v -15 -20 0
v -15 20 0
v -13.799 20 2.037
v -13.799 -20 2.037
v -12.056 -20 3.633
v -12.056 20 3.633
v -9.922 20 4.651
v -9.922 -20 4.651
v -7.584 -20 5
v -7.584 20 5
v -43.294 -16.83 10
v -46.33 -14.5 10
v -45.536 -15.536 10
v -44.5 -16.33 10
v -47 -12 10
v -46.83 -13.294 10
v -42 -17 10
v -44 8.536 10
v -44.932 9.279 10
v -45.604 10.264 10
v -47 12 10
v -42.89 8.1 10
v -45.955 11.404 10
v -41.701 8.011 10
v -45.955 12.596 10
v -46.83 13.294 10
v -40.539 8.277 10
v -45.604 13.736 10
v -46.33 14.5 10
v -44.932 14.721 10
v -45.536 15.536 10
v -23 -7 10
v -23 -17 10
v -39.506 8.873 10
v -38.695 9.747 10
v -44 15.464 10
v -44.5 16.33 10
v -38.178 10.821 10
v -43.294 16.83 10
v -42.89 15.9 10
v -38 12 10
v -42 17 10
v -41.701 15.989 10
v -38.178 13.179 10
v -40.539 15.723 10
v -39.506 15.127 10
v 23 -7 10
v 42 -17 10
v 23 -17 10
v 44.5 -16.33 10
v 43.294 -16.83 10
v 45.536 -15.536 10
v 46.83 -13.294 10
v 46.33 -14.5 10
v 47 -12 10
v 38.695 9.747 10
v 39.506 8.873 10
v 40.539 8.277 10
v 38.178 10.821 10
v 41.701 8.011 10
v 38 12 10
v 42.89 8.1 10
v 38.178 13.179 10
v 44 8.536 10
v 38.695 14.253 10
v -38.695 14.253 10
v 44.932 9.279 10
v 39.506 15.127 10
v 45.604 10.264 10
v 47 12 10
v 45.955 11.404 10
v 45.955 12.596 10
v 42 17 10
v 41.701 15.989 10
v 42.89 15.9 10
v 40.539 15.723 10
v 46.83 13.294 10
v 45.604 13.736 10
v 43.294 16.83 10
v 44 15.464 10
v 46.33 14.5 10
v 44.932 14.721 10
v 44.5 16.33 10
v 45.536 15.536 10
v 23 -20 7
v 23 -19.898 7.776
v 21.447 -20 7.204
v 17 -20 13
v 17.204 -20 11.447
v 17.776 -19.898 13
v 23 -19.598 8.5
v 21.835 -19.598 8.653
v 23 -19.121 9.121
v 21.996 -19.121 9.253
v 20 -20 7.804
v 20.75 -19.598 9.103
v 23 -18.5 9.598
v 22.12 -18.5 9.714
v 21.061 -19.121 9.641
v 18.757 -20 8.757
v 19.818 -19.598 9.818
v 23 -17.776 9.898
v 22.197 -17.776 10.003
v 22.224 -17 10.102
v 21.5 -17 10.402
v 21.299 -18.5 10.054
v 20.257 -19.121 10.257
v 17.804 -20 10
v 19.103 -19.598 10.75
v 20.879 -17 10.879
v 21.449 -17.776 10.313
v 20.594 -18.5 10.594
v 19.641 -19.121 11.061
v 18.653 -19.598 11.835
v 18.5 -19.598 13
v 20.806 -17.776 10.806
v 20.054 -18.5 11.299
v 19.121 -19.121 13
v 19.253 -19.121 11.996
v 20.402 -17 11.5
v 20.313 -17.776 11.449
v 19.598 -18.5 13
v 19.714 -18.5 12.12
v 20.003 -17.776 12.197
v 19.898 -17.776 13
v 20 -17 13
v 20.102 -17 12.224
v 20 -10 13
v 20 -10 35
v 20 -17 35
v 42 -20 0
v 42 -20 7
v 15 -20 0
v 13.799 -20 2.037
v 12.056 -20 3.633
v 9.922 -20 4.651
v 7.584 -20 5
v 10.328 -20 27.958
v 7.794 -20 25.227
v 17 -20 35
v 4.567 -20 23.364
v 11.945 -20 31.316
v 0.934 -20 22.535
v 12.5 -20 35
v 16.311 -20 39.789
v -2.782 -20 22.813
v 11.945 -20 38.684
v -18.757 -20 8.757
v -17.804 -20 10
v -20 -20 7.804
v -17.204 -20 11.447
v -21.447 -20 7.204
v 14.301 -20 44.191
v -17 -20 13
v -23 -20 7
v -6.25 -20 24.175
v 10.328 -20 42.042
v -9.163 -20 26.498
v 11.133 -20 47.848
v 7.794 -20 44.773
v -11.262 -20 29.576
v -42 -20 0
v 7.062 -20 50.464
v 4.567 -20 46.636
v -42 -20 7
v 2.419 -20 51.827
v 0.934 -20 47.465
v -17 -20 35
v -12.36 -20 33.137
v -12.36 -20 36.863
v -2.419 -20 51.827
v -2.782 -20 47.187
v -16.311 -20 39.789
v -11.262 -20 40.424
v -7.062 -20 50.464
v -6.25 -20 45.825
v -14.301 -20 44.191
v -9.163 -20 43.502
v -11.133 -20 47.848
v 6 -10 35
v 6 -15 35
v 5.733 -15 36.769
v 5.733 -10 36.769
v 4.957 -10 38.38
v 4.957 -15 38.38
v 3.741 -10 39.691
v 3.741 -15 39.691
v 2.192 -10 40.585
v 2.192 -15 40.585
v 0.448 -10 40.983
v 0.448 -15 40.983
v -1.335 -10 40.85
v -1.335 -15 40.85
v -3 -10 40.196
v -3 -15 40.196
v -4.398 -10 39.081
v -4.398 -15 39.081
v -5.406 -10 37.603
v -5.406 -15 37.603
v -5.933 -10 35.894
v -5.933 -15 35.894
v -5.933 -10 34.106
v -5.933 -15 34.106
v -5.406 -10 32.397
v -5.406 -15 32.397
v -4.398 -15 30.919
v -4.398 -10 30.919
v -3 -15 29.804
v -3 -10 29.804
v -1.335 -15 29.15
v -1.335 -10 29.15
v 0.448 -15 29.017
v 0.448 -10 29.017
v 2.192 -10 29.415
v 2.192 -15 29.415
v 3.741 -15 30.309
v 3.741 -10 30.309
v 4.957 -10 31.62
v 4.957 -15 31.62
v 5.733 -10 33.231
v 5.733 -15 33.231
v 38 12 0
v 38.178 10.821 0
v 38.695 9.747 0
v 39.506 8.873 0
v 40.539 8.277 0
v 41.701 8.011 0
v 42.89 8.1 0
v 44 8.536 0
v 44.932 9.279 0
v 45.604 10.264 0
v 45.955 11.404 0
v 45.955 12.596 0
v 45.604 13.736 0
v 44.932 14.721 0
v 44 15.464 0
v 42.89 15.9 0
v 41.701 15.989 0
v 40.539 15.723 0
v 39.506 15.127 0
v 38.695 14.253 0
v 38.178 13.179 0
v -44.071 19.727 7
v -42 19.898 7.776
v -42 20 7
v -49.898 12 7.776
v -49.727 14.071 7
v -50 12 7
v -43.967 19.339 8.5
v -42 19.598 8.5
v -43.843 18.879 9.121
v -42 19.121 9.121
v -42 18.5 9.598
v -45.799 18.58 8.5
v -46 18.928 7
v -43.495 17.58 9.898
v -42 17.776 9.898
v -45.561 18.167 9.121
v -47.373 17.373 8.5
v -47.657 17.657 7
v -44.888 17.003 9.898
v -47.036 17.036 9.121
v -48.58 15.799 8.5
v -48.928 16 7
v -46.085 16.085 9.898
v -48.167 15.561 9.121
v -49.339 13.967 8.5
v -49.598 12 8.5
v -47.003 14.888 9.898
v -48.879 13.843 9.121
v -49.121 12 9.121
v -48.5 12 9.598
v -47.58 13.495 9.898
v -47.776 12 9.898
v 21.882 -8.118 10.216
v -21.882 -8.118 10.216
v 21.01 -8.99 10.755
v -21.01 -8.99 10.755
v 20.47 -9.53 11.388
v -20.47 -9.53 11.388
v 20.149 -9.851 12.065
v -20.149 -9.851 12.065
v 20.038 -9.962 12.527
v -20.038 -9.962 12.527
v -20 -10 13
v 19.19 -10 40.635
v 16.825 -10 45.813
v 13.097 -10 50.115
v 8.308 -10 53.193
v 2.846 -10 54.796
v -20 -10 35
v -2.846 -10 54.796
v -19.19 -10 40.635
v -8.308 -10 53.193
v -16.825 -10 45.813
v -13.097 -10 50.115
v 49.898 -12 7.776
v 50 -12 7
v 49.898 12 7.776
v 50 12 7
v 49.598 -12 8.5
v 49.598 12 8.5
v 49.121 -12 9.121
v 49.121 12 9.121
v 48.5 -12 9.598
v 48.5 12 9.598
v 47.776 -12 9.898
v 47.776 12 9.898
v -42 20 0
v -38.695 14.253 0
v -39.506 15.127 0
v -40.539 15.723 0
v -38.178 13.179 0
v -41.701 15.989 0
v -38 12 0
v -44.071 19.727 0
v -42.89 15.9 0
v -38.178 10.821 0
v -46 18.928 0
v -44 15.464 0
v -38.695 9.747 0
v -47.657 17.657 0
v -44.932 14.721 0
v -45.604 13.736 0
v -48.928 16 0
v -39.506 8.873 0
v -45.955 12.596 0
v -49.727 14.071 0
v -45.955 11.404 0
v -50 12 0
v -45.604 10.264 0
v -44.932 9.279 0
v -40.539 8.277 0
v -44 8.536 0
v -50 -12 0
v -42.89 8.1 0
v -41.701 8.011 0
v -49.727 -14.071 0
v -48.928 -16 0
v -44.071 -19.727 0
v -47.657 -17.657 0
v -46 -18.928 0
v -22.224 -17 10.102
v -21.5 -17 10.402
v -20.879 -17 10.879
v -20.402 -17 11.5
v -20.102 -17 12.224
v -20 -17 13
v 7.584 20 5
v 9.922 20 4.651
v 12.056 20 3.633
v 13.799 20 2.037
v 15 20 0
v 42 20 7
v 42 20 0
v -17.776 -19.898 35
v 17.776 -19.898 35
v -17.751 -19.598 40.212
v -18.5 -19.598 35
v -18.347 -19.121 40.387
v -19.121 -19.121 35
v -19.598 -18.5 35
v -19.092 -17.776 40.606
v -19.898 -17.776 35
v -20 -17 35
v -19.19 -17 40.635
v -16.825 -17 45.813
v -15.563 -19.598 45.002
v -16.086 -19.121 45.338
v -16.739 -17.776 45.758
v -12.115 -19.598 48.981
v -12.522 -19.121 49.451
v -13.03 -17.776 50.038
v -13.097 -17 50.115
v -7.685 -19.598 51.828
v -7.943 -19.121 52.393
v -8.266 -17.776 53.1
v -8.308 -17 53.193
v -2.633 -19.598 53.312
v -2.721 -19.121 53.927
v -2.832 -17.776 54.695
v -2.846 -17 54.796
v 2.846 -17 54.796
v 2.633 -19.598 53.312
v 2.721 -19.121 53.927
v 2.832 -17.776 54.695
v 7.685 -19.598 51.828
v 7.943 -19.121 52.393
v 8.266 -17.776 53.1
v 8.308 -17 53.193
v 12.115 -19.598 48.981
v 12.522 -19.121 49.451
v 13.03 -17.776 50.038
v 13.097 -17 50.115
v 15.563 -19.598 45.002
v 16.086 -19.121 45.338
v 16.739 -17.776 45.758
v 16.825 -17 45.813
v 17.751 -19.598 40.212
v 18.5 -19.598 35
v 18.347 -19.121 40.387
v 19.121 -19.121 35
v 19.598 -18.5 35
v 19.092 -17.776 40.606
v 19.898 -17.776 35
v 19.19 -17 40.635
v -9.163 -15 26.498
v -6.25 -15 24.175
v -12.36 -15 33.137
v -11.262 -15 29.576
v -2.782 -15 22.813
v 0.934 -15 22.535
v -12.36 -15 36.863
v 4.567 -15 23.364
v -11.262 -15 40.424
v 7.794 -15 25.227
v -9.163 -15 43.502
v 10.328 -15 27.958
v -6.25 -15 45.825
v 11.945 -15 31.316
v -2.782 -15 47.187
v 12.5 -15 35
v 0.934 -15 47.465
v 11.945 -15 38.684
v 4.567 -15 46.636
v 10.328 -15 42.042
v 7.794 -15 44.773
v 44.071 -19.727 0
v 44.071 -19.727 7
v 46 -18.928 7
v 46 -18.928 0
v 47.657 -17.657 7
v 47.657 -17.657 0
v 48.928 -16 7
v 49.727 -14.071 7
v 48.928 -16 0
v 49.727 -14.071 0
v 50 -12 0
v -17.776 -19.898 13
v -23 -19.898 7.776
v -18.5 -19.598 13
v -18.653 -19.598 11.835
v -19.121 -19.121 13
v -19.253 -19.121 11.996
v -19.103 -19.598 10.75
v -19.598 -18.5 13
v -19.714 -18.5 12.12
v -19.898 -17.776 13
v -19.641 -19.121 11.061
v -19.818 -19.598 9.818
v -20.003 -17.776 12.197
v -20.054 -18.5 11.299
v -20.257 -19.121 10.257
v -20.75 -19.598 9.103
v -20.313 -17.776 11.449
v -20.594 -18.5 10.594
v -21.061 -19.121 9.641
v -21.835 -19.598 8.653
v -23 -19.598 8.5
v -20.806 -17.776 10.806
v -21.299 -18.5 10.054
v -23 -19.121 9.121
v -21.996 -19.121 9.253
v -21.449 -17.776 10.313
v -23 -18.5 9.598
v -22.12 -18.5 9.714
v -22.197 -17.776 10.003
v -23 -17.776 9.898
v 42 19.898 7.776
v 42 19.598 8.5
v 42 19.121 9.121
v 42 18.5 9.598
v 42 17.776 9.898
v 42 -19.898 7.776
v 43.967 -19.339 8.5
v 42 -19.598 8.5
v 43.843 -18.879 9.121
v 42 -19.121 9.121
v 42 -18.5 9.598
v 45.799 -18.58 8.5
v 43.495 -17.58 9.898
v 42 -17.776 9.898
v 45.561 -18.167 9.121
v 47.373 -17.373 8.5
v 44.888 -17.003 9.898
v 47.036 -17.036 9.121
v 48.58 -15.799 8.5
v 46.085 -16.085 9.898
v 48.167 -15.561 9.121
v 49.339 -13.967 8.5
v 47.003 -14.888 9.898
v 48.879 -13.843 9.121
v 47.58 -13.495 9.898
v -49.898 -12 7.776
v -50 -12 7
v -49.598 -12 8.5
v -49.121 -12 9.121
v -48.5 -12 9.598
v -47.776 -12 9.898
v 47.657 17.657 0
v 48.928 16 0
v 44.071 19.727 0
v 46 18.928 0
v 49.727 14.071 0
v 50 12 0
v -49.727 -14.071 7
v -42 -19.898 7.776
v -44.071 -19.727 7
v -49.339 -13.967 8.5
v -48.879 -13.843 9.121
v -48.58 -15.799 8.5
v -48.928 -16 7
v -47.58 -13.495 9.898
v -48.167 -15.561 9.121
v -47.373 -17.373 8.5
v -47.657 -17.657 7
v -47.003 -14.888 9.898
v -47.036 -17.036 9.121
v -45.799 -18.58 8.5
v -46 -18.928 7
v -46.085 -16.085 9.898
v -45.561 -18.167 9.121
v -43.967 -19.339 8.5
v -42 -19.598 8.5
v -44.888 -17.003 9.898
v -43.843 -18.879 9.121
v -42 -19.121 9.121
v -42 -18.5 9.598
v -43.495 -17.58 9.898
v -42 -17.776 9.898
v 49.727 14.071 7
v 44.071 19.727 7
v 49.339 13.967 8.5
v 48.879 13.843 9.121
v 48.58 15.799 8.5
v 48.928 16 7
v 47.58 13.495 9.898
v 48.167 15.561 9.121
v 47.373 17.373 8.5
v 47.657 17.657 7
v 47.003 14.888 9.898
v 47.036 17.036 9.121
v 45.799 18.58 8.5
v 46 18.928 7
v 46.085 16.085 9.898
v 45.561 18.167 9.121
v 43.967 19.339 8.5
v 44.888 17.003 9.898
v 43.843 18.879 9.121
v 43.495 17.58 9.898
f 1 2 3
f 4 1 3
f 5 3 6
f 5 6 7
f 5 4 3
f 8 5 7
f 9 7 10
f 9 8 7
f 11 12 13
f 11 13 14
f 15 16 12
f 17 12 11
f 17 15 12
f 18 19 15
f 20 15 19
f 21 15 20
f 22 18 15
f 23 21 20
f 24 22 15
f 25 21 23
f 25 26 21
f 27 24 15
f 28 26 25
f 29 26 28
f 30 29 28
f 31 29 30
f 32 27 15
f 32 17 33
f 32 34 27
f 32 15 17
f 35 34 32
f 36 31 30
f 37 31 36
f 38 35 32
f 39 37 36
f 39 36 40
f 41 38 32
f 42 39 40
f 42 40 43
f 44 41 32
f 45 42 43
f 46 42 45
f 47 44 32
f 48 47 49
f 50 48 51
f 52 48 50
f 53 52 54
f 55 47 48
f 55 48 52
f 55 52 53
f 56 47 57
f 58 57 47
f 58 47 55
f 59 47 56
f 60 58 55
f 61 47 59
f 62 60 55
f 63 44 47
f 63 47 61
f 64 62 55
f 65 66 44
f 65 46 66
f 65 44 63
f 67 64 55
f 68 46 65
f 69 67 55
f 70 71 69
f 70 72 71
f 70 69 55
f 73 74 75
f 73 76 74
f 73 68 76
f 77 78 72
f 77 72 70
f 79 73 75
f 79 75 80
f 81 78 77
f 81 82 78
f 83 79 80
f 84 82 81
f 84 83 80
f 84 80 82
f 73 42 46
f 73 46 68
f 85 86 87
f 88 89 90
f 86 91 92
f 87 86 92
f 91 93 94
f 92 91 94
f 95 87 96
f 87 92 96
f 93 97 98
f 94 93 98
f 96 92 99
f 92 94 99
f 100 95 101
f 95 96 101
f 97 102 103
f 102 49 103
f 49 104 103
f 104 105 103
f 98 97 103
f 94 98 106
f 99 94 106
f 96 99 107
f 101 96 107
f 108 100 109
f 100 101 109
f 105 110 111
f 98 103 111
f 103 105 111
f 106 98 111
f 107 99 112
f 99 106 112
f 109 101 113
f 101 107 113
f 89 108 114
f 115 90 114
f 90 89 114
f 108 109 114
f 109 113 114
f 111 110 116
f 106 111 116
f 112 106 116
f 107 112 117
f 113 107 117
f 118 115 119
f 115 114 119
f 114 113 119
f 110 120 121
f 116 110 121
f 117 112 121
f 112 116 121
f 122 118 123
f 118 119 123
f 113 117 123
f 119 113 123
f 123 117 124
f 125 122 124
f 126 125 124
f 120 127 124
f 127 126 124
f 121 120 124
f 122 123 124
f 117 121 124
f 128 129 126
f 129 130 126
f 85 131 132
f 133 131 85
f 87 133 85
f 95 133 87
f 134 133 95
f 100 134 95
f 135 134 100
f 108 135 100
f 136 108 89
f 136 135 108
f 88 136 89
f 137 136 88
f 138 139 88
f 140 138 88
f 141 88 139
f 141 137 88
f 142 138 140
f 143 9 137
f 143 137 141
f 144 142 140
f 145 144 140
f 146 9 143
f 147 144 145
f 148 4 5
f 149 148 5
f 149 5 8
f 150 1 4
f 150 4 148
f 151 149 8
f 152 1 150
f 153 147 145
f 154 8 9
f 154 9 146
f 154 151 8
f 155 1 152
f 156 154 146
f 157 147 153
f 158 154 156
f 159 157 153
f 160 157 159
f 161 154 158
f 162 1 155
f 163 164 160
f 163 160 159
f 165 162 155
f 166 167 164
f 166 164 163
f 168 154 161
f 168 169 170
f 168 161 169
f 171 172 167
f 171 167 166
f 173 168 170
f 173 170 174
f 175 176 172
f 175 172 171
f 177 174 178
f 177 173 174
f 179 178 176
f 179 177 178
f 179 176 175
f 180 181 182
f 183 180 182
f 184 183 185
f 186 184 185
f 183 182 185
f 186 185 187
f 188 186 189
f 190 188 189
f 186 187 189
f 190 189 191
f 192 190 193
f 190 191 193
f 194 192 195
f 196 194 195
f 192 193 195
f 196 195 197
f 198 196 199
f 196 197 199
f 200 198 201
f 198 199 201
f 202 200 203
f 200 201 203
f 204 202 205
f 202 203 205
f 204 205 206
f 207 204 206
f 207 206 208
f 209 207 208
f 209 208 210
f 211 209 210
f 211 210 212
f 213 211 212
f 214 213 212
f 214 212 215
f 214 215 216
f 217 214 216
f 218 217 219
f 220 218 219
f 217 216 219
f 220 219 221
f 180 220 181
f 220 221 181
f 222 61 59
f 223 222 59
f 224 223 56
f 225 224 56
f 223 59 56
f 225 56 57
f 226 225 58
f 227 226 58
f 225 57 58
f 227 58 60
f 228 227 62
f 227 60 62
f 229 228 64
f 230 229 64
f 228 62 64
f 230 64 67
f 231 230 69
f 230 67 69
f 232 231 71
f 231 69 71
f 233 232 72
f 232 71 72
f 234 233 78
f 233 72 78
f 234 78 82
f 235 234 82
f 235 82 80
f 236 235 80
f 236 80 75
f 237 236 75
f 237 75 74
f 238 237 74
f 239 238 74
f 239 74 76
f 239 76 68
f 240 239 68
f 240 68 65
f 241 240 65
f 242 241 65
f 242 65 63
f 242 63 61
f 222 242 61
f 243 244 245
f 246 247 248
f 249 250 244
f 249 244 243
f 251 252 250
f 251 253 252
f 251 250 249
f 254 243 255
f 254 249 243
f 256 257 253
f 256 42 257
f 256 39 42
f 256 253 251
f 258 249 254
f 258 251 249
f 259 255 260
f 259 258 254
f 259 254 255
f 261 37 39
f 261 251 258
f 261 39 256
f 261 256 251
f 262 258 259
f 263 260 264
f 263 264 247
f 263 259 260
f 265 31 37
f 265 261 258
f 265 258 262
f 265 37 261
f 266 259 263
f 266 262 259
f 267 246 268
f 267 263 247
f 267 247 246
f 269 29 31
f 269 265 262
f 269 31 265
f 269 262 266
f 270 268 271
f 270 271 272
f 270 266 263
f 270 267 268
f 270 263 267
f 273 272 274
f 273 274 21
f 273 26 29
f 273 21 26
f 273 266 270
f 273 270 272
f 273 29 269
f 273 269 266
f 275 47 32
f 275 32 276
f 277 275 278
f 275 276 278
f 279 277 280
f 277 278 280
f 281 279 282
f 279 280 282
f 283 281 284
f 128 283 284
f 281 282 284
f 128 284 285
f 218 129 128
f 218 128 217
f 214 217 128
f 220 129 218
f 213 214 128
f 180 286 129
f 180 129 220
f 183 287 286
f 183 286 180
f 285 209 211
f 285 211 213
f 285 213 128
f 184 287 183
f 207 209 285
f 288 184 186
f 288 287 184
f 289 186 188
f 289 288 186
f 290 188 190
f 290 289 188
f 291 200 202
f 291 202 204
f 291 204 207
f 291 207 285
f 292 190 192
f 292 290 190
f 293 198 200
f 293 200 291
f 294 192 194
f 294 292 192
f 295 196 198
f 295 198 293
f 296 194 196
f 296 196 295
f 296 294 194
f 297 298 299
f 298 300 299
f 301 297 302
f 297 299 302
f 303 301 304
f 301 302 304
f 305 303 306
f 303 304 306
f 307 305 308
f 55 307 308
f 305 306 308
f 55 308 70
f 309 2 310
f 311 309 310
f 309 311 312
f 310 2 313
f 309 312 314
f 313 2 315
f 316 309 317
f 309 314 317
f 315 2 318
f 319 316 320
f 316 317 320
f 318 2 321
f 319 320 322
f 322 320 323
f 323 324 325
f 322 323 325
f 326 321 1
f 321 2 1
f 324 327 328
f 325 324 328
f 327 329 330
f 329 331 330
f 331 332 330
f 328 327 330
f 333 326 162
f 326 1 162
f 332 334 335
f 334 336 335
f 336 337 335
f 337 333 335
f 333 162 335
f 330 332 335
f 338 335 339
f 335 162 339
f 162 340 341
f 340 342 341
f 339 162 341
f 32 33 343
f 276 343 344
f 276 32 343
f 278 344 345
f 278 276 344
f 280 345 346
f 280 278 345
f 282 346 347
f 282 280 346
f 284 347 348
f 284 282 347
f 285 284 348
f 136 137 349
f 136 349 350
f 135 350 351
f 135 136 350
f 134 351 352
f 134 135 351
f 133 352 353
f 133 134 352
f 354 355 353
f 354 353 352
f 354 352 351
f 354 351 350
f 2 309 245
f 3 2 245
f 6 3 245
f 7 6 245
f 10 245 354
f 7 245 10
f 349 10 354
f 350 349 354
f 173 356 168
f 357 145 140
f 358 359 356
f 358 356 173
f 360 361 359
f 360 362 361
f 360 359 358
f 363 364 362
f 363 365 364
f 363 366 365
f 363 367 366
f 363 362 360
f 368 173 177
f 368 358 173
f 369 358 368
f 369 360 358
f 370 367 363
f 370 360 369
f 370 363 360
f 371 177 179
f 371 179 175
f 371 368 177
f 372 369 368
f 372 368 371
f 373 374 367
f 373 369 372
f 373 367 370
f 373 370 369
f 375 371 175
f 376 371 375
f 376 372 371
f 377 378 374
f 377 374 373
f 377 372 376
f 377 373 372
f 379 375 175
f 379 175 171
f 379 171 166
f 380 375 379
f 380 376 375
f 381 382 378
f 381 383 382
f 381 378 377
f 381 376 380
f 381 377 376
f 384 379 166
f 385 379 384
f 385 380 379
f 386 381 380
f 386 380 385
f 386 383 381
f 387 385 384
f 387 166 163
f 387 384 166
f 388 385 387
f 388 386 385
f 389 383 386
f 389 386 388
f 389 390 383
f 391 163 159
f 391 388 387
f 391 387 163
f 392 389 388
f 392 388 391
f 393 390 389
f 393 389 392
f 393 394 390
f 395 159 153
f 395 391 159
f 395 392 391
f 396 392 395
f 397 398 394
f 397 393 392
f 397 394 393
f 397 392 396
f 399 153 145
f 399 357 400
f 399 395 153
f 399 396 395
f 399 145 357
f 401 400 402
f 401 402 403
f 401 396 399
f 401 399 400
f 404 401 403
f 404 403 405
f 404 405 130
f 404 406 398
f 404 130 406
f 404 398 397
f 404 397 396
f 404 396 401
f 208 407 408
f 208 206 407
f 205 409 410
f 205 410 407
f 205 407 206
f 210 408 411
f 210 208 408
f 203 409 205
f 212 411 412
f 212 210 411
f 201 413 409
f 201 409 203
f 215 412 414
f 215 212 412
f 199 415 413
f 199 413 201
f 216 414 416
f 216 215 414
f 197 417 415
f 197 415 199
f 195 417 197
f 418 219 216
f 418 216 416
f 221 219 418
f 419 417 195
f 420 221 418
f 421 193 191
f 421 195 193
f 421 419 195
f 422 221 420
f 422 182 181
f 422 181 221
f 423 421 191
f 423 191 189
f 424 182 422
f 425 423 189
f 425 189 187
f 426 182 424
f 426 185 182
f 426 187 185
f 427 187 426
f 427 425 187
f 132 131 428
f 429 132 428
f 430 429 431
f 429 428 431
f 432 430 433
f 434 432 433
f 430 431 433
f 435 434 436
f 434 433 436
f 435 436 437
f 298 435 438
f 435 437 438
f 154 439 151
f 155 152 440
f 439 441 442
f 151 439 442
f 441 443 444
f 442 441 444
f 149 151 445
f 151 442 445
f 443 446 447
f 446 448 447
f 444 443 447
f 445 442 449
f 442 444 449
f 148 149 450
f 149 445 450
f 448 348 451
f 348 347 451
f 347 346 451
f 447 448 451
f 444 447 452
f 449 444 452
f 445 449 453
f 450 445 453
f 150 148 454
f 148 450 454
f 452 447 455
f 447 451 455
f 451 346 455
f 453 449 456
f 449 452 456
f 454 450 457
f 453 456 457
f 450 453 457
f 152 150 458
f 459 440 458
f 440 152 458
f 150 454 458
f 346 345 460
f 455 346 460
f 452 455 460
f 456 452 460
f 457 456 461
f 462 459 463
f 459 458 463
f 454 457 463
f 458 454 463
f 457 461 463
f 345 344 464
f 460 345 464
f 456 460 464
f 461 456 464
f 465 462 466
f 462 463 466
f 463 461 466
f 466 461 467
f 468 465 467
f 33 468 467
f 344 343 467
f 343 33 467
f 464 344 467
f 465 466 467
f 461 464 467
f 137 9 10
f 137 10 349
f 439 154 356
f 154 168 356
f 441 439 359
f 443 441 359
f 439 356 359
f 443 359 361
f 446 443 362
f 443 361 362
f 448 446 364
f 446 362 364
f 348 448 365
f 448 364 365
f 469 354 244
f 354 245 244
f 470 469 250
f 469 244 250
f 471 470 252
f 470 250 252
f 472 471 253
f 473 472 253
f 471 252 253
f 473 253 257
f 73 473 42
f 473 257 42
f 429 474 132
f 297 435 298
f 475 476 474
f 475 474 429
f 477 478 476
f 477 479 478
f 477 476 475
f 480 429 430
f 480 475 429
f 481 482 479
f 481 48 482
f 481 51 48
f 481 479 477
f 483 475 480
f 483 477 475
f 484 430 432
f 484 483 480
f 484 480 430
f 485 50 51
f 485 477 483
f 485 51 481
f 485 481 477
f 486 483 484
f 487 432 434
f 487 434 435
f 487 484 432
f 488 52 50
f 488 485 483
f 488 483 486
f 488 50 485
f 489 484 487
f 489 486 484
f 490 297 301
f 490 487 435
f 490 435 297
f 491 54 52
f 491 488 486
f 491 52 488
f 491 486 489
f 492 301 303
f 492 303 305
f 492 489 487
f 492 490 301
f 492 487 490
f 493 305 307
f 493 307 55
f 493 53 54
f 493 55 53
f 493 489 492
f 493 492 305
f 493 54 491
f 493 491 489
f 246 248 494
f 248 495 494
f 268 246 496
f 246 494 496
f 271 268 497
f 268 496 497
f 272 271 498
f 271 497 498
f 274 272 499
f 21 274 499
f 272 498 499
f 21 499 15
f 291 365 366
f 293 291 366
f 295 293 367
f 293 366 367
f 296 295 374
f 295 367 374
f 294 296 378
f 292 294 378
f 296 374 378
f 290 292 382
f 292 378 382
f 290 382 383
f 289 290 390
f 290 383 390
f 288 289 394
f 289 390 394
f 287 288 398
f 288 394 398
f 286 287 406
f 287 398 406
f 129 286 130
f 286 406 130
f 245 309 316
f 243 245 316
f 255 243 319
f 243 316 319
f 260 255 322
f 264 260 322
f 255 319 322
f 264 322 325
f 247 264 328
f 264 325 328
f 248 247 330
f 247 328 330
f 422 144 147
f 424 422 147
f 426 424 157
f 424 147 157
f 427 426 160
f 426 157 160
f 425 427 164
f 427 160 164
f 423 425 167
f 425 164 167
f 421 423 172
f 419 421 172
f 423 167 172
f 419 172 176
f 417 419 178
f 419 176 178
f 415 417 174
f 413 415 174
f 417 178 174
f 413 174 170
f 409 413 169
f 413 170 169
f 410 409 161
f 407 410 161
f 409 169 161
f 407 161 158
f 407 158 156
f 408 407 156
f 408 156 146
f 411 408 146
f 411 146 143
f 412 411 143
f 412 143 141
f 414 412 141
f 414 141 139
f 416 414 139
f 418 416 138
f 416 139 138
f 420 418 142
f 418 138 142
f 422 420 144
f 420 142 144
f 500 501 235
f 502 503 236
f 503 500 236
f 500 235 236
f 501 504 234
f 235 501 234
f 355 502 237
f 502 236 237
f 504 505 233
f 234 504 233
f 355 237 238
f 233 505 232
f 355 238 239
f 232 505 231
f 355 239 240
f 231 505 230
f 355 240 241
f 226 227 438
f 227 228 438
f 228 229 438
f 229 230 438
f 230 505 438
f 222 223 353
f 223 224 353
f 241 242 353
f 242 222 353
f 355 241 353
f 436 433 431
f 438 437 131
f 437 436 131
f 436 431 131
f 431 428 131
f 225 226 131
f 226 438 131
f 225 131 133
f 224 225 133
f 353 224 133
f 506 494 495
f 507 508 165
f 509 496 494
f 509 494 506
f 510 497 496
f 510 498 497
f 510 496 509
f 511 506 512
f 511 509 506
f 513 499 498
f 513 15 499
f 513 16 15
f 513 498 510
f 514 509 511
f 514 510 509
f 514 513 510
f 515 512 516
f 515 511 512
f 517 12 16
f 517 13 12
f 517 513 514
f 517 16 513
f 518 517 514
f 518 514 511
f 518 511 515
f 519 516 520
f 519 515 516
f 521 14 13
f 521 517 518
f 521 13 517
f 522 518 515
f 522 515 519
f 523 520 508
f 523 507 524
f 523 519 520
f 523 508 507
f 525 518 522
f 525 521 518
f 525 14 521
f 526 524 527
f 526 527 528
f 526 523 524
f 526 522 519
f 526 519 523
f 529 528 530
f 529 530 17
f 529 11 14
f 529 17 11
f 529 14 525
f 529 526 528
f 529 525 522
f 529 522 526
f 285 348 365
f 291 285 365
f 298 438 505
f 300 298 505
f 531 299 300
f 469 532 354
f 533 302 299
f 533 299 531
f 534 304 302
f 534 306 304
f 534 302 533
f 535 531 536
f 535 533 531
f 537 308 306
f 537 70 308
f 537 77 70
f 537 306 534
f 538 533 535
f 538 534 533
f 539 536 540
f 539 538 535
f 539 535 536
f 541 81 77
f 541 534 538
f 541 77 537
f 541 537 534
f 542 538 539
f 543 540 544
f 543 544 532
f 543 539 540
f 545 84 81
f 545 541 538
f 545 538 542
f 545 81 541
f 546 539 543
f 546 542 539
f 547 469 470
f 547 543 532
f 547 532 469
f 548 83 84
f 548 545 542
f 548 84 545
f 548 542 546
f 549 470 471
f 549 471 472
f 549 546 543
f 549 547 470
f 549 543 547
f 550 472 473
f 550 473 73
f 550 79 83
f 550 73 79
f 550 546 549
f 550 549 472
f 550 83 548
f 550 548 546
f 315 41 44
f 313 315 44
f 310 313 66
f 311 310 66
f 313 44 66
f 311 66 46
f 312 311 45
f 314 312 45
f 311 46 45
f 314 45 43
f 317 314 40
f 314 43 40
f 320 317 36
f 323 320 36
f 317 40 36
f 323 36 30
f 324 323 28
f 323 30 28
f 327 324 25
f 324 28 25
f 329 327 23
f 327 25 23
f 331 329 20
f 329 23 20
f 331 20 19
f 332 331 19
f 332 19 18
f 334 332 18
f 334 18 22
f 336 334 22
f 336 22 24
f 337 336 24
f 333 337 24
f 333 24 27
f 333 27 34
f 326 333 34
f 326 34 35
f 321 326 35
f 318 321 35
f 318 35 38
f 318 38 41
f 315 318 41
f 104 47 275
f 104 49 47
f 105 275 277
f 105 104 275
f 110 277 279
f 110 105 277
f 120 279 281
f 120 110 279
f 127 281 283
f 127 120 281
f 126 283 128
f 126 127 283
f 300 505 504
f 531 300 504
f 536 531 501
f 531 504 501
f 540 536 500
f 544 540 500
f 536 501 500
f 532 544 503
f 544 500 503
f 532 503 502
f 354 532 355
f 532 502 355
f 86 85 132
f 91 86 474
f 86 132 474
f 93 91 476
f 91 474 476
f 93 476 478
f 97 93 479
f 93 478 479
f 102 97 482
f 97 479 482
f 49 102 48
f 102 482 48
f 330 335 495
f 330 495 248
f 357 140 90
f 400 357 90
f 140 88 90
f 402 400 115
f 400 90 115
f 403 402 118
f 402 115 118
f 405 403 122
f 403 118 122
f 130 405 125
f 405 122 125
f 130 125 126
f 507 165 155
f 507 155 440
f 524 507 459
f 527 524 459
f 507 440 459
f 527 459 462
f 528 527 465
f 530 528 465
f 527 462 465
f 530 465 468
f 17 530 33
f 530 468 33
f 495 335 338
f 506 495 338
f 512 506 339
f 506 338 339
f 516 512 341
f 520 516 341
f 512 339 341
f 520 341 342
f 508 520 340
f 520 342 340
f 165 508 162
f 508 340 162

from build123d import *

# Parameters (mm, degrees)
SKETCH_1_W          = 100
SKETCH_1_H          = 40
EXTRUDE_1_DEPTH     = 10
EXTRUDE_2_DEPTH     = 10
SKETCH_4_R          = 12.5
CUT_EXTRUDE_1_DEPTH = 5
SKETCH_5_R          = 6
CUT_EXTRUDE_2_DEPTH = 5
SKETCH_6_W          = 30
SKETCH_6_H          = 5
CUT_EXTRUDE_3_DEPTH = 85.409715081
FILLET_1_R          = 8
FILLET_2_R          = 3
SKETCH_7_R          = 4
CUT_EXTRUDE_5_DEPTH = 71.178344238


with BuildPart() as part:
    # Эскиз1 → Бобышка-Вытянуть1 (new body)
    with BuildSketch(Plane.XY):
        Rectangle(SKETCH_1_W, SKETCH_1_H)
    extrude(amount=EXTRUDE_1_DEPTH)

    # Эскиз2 → Бобышка-Вытянуть2 (add)
    with BuildSketch(Plane.XZ.offset(20)):
        with BuildLine():
            Line((-20, 0), (-20, 35))
            ThreePointArc((-20, 35), (0, 55), (20, 35))
            Line((20, 35), (20, 0))
            Line((20, 0), (-20, 0))
        make_face()
    extrude(amount=-EXTRUDE_2_DEPTH)

    # Эскиз4 → Вырез-Вытянуть1 (cut)
    with BuildSketch(Plane.XZ.offset(20)):
        with Locations((0, 35)):
            Circle(SKETCH_4_R)
    extrude(amount=-CUT_EXTRUDE_1_DEPTH, mode=Mode.SUBTRACT)

    # Эскиз5 → Вырез-Вытянуть2 (cut)
    with BuildSketch(Plane.XZ.offset(15)):
        with Locations((0, 35)):
            Circle(SKETCH_5_R)
    extrude(amount=-CUT_EXTRUDE_2_DEPTH, mode=Mode.SUBTRACT)

    # Эскиз6 → Вырез-Вытянуть3 (cut, through all)
    with BuildSketch(Plane.XZ.offset(20)):
        with Locations((0, 2.5)):
            Rectangle(SKETCH_6_W, SKETCH_6_H)
    extrude(amount=-CUT_EXTRUDE_3_DEPTH, mode=Mode.SUBTRACT)

    # Скругление1
    # the kernel refuses this fillet: 8 mm, written as the material it adds along each edge
    with BuildSketch(Plane(origin=(-15, -20, 5), x_dir=(1, 0, 0), z_dir=(0, 1, 0))) as fillet_1_piece_1:
        with BuildLine():
            CenterArc((7.416198487, 8), FILLET_1_R, 202.024312837, 67.975687163)
            Line((0, 5), (0, 0))
            Line((0, 0), (7.416198487, 0))
        make_face()
    extrude(amount=40)
    with BuildSketch(Plane(origin=(15, -20, 5), x_dir=(0, 0, -1), z_dir=(0, 1, 0))) as fillet_1_piece_2:
        with BuildLine():
            CenterArc((8, 7.416198487), FILLET_1_R, 180, 67.975687163)
            Line((0, 7.416198487), (0, 0))
            Line((0, 0), (5, 0))
        make_face()
    extrude(amount=40)
    # the kernel refuses this fillet: 8 mm, written as the material it takes off along each edge
    with BuildSketch(Plane(origin=(50, -20, -20), x_dir=(-1, 0, 0), z_dir=(0, 0, 1)), Plane(origin=(50, 20, -20), x_dir=(0, -1, 0), z_dir=(0, 0, 1))) as fillet_1_2_piece_1:
        with BuildLine():
            CenterArc((FILLET_1_R, -FILLET_1_R), FILLET_1_R, 90, 90)
            Line((0, -FILLET_1_R), (0, 0))
            Line((0, 0), (FILLET_1_R, 0))
        make_face()
    extrude(amount=50, mode=Mode.SUBTRACT)
    with BuildSketch(Plane(origin=(-50, -20, -20), x_dir=(1, 0, 0), z_dir=(0, 0, 1)), Plane(origin=(-50, 20, -20), x_dir=(0, -1, 0), z_dir=(0, 0, 1))) as fillet_1_2_piece_2:
        with BuildLine():
            CenterArc((FILLET_1_R, FILLET_1_R), FILLET_1_R, 180, 90)
            Line((0, FILLET_1_R), (0, 0))
            Line((0, 0), (FILLET_1_R, 0))
        make_face()
    extrude(amount=50, mode=Mode.SUBTRACT)

    # Скругление2
    fillet_2_edges = [part.edges().sort_by_distance(p)[0] for p in [
        (31, -20, 10),
        (-20, -15, 10),
        (-20, -20, 22.5),
        (0, -20, 55),
        (20, -15, 10),
        (0, -10, 10),
        (20, -20, 22.5),
        (50, 0, 10),
        (-31, -20, 10),
        (0, 20, 10),
        (-50, 0, 10),
        (47.656854249, 17.656854249, 10),
        (-47.656854249, 17.656854249, 10),
        (-47.656854249, -17.656854249, 10),
        (47.656854249, -17.656854249, 10),
    ]]
    fillet(fillet_2_edges, radius=FILLET_2_R)

    # Эскиз7 → Вырез-Вытянуть5 (cut, through all)
    with BuildSketch(Plane.XY.offset(10)):
        with Locations((-42, 12)):
            Circle(SKETCH_7_R)
        with Locations(Location((42, 12, 0), (0, 0, 180))):
            Circle(SKETCH_7_R)
    extrude(amount=-CUT_EXTRUDE_5_DEPTH, mode=Mode.SUBTRACT)


solid = part.part
